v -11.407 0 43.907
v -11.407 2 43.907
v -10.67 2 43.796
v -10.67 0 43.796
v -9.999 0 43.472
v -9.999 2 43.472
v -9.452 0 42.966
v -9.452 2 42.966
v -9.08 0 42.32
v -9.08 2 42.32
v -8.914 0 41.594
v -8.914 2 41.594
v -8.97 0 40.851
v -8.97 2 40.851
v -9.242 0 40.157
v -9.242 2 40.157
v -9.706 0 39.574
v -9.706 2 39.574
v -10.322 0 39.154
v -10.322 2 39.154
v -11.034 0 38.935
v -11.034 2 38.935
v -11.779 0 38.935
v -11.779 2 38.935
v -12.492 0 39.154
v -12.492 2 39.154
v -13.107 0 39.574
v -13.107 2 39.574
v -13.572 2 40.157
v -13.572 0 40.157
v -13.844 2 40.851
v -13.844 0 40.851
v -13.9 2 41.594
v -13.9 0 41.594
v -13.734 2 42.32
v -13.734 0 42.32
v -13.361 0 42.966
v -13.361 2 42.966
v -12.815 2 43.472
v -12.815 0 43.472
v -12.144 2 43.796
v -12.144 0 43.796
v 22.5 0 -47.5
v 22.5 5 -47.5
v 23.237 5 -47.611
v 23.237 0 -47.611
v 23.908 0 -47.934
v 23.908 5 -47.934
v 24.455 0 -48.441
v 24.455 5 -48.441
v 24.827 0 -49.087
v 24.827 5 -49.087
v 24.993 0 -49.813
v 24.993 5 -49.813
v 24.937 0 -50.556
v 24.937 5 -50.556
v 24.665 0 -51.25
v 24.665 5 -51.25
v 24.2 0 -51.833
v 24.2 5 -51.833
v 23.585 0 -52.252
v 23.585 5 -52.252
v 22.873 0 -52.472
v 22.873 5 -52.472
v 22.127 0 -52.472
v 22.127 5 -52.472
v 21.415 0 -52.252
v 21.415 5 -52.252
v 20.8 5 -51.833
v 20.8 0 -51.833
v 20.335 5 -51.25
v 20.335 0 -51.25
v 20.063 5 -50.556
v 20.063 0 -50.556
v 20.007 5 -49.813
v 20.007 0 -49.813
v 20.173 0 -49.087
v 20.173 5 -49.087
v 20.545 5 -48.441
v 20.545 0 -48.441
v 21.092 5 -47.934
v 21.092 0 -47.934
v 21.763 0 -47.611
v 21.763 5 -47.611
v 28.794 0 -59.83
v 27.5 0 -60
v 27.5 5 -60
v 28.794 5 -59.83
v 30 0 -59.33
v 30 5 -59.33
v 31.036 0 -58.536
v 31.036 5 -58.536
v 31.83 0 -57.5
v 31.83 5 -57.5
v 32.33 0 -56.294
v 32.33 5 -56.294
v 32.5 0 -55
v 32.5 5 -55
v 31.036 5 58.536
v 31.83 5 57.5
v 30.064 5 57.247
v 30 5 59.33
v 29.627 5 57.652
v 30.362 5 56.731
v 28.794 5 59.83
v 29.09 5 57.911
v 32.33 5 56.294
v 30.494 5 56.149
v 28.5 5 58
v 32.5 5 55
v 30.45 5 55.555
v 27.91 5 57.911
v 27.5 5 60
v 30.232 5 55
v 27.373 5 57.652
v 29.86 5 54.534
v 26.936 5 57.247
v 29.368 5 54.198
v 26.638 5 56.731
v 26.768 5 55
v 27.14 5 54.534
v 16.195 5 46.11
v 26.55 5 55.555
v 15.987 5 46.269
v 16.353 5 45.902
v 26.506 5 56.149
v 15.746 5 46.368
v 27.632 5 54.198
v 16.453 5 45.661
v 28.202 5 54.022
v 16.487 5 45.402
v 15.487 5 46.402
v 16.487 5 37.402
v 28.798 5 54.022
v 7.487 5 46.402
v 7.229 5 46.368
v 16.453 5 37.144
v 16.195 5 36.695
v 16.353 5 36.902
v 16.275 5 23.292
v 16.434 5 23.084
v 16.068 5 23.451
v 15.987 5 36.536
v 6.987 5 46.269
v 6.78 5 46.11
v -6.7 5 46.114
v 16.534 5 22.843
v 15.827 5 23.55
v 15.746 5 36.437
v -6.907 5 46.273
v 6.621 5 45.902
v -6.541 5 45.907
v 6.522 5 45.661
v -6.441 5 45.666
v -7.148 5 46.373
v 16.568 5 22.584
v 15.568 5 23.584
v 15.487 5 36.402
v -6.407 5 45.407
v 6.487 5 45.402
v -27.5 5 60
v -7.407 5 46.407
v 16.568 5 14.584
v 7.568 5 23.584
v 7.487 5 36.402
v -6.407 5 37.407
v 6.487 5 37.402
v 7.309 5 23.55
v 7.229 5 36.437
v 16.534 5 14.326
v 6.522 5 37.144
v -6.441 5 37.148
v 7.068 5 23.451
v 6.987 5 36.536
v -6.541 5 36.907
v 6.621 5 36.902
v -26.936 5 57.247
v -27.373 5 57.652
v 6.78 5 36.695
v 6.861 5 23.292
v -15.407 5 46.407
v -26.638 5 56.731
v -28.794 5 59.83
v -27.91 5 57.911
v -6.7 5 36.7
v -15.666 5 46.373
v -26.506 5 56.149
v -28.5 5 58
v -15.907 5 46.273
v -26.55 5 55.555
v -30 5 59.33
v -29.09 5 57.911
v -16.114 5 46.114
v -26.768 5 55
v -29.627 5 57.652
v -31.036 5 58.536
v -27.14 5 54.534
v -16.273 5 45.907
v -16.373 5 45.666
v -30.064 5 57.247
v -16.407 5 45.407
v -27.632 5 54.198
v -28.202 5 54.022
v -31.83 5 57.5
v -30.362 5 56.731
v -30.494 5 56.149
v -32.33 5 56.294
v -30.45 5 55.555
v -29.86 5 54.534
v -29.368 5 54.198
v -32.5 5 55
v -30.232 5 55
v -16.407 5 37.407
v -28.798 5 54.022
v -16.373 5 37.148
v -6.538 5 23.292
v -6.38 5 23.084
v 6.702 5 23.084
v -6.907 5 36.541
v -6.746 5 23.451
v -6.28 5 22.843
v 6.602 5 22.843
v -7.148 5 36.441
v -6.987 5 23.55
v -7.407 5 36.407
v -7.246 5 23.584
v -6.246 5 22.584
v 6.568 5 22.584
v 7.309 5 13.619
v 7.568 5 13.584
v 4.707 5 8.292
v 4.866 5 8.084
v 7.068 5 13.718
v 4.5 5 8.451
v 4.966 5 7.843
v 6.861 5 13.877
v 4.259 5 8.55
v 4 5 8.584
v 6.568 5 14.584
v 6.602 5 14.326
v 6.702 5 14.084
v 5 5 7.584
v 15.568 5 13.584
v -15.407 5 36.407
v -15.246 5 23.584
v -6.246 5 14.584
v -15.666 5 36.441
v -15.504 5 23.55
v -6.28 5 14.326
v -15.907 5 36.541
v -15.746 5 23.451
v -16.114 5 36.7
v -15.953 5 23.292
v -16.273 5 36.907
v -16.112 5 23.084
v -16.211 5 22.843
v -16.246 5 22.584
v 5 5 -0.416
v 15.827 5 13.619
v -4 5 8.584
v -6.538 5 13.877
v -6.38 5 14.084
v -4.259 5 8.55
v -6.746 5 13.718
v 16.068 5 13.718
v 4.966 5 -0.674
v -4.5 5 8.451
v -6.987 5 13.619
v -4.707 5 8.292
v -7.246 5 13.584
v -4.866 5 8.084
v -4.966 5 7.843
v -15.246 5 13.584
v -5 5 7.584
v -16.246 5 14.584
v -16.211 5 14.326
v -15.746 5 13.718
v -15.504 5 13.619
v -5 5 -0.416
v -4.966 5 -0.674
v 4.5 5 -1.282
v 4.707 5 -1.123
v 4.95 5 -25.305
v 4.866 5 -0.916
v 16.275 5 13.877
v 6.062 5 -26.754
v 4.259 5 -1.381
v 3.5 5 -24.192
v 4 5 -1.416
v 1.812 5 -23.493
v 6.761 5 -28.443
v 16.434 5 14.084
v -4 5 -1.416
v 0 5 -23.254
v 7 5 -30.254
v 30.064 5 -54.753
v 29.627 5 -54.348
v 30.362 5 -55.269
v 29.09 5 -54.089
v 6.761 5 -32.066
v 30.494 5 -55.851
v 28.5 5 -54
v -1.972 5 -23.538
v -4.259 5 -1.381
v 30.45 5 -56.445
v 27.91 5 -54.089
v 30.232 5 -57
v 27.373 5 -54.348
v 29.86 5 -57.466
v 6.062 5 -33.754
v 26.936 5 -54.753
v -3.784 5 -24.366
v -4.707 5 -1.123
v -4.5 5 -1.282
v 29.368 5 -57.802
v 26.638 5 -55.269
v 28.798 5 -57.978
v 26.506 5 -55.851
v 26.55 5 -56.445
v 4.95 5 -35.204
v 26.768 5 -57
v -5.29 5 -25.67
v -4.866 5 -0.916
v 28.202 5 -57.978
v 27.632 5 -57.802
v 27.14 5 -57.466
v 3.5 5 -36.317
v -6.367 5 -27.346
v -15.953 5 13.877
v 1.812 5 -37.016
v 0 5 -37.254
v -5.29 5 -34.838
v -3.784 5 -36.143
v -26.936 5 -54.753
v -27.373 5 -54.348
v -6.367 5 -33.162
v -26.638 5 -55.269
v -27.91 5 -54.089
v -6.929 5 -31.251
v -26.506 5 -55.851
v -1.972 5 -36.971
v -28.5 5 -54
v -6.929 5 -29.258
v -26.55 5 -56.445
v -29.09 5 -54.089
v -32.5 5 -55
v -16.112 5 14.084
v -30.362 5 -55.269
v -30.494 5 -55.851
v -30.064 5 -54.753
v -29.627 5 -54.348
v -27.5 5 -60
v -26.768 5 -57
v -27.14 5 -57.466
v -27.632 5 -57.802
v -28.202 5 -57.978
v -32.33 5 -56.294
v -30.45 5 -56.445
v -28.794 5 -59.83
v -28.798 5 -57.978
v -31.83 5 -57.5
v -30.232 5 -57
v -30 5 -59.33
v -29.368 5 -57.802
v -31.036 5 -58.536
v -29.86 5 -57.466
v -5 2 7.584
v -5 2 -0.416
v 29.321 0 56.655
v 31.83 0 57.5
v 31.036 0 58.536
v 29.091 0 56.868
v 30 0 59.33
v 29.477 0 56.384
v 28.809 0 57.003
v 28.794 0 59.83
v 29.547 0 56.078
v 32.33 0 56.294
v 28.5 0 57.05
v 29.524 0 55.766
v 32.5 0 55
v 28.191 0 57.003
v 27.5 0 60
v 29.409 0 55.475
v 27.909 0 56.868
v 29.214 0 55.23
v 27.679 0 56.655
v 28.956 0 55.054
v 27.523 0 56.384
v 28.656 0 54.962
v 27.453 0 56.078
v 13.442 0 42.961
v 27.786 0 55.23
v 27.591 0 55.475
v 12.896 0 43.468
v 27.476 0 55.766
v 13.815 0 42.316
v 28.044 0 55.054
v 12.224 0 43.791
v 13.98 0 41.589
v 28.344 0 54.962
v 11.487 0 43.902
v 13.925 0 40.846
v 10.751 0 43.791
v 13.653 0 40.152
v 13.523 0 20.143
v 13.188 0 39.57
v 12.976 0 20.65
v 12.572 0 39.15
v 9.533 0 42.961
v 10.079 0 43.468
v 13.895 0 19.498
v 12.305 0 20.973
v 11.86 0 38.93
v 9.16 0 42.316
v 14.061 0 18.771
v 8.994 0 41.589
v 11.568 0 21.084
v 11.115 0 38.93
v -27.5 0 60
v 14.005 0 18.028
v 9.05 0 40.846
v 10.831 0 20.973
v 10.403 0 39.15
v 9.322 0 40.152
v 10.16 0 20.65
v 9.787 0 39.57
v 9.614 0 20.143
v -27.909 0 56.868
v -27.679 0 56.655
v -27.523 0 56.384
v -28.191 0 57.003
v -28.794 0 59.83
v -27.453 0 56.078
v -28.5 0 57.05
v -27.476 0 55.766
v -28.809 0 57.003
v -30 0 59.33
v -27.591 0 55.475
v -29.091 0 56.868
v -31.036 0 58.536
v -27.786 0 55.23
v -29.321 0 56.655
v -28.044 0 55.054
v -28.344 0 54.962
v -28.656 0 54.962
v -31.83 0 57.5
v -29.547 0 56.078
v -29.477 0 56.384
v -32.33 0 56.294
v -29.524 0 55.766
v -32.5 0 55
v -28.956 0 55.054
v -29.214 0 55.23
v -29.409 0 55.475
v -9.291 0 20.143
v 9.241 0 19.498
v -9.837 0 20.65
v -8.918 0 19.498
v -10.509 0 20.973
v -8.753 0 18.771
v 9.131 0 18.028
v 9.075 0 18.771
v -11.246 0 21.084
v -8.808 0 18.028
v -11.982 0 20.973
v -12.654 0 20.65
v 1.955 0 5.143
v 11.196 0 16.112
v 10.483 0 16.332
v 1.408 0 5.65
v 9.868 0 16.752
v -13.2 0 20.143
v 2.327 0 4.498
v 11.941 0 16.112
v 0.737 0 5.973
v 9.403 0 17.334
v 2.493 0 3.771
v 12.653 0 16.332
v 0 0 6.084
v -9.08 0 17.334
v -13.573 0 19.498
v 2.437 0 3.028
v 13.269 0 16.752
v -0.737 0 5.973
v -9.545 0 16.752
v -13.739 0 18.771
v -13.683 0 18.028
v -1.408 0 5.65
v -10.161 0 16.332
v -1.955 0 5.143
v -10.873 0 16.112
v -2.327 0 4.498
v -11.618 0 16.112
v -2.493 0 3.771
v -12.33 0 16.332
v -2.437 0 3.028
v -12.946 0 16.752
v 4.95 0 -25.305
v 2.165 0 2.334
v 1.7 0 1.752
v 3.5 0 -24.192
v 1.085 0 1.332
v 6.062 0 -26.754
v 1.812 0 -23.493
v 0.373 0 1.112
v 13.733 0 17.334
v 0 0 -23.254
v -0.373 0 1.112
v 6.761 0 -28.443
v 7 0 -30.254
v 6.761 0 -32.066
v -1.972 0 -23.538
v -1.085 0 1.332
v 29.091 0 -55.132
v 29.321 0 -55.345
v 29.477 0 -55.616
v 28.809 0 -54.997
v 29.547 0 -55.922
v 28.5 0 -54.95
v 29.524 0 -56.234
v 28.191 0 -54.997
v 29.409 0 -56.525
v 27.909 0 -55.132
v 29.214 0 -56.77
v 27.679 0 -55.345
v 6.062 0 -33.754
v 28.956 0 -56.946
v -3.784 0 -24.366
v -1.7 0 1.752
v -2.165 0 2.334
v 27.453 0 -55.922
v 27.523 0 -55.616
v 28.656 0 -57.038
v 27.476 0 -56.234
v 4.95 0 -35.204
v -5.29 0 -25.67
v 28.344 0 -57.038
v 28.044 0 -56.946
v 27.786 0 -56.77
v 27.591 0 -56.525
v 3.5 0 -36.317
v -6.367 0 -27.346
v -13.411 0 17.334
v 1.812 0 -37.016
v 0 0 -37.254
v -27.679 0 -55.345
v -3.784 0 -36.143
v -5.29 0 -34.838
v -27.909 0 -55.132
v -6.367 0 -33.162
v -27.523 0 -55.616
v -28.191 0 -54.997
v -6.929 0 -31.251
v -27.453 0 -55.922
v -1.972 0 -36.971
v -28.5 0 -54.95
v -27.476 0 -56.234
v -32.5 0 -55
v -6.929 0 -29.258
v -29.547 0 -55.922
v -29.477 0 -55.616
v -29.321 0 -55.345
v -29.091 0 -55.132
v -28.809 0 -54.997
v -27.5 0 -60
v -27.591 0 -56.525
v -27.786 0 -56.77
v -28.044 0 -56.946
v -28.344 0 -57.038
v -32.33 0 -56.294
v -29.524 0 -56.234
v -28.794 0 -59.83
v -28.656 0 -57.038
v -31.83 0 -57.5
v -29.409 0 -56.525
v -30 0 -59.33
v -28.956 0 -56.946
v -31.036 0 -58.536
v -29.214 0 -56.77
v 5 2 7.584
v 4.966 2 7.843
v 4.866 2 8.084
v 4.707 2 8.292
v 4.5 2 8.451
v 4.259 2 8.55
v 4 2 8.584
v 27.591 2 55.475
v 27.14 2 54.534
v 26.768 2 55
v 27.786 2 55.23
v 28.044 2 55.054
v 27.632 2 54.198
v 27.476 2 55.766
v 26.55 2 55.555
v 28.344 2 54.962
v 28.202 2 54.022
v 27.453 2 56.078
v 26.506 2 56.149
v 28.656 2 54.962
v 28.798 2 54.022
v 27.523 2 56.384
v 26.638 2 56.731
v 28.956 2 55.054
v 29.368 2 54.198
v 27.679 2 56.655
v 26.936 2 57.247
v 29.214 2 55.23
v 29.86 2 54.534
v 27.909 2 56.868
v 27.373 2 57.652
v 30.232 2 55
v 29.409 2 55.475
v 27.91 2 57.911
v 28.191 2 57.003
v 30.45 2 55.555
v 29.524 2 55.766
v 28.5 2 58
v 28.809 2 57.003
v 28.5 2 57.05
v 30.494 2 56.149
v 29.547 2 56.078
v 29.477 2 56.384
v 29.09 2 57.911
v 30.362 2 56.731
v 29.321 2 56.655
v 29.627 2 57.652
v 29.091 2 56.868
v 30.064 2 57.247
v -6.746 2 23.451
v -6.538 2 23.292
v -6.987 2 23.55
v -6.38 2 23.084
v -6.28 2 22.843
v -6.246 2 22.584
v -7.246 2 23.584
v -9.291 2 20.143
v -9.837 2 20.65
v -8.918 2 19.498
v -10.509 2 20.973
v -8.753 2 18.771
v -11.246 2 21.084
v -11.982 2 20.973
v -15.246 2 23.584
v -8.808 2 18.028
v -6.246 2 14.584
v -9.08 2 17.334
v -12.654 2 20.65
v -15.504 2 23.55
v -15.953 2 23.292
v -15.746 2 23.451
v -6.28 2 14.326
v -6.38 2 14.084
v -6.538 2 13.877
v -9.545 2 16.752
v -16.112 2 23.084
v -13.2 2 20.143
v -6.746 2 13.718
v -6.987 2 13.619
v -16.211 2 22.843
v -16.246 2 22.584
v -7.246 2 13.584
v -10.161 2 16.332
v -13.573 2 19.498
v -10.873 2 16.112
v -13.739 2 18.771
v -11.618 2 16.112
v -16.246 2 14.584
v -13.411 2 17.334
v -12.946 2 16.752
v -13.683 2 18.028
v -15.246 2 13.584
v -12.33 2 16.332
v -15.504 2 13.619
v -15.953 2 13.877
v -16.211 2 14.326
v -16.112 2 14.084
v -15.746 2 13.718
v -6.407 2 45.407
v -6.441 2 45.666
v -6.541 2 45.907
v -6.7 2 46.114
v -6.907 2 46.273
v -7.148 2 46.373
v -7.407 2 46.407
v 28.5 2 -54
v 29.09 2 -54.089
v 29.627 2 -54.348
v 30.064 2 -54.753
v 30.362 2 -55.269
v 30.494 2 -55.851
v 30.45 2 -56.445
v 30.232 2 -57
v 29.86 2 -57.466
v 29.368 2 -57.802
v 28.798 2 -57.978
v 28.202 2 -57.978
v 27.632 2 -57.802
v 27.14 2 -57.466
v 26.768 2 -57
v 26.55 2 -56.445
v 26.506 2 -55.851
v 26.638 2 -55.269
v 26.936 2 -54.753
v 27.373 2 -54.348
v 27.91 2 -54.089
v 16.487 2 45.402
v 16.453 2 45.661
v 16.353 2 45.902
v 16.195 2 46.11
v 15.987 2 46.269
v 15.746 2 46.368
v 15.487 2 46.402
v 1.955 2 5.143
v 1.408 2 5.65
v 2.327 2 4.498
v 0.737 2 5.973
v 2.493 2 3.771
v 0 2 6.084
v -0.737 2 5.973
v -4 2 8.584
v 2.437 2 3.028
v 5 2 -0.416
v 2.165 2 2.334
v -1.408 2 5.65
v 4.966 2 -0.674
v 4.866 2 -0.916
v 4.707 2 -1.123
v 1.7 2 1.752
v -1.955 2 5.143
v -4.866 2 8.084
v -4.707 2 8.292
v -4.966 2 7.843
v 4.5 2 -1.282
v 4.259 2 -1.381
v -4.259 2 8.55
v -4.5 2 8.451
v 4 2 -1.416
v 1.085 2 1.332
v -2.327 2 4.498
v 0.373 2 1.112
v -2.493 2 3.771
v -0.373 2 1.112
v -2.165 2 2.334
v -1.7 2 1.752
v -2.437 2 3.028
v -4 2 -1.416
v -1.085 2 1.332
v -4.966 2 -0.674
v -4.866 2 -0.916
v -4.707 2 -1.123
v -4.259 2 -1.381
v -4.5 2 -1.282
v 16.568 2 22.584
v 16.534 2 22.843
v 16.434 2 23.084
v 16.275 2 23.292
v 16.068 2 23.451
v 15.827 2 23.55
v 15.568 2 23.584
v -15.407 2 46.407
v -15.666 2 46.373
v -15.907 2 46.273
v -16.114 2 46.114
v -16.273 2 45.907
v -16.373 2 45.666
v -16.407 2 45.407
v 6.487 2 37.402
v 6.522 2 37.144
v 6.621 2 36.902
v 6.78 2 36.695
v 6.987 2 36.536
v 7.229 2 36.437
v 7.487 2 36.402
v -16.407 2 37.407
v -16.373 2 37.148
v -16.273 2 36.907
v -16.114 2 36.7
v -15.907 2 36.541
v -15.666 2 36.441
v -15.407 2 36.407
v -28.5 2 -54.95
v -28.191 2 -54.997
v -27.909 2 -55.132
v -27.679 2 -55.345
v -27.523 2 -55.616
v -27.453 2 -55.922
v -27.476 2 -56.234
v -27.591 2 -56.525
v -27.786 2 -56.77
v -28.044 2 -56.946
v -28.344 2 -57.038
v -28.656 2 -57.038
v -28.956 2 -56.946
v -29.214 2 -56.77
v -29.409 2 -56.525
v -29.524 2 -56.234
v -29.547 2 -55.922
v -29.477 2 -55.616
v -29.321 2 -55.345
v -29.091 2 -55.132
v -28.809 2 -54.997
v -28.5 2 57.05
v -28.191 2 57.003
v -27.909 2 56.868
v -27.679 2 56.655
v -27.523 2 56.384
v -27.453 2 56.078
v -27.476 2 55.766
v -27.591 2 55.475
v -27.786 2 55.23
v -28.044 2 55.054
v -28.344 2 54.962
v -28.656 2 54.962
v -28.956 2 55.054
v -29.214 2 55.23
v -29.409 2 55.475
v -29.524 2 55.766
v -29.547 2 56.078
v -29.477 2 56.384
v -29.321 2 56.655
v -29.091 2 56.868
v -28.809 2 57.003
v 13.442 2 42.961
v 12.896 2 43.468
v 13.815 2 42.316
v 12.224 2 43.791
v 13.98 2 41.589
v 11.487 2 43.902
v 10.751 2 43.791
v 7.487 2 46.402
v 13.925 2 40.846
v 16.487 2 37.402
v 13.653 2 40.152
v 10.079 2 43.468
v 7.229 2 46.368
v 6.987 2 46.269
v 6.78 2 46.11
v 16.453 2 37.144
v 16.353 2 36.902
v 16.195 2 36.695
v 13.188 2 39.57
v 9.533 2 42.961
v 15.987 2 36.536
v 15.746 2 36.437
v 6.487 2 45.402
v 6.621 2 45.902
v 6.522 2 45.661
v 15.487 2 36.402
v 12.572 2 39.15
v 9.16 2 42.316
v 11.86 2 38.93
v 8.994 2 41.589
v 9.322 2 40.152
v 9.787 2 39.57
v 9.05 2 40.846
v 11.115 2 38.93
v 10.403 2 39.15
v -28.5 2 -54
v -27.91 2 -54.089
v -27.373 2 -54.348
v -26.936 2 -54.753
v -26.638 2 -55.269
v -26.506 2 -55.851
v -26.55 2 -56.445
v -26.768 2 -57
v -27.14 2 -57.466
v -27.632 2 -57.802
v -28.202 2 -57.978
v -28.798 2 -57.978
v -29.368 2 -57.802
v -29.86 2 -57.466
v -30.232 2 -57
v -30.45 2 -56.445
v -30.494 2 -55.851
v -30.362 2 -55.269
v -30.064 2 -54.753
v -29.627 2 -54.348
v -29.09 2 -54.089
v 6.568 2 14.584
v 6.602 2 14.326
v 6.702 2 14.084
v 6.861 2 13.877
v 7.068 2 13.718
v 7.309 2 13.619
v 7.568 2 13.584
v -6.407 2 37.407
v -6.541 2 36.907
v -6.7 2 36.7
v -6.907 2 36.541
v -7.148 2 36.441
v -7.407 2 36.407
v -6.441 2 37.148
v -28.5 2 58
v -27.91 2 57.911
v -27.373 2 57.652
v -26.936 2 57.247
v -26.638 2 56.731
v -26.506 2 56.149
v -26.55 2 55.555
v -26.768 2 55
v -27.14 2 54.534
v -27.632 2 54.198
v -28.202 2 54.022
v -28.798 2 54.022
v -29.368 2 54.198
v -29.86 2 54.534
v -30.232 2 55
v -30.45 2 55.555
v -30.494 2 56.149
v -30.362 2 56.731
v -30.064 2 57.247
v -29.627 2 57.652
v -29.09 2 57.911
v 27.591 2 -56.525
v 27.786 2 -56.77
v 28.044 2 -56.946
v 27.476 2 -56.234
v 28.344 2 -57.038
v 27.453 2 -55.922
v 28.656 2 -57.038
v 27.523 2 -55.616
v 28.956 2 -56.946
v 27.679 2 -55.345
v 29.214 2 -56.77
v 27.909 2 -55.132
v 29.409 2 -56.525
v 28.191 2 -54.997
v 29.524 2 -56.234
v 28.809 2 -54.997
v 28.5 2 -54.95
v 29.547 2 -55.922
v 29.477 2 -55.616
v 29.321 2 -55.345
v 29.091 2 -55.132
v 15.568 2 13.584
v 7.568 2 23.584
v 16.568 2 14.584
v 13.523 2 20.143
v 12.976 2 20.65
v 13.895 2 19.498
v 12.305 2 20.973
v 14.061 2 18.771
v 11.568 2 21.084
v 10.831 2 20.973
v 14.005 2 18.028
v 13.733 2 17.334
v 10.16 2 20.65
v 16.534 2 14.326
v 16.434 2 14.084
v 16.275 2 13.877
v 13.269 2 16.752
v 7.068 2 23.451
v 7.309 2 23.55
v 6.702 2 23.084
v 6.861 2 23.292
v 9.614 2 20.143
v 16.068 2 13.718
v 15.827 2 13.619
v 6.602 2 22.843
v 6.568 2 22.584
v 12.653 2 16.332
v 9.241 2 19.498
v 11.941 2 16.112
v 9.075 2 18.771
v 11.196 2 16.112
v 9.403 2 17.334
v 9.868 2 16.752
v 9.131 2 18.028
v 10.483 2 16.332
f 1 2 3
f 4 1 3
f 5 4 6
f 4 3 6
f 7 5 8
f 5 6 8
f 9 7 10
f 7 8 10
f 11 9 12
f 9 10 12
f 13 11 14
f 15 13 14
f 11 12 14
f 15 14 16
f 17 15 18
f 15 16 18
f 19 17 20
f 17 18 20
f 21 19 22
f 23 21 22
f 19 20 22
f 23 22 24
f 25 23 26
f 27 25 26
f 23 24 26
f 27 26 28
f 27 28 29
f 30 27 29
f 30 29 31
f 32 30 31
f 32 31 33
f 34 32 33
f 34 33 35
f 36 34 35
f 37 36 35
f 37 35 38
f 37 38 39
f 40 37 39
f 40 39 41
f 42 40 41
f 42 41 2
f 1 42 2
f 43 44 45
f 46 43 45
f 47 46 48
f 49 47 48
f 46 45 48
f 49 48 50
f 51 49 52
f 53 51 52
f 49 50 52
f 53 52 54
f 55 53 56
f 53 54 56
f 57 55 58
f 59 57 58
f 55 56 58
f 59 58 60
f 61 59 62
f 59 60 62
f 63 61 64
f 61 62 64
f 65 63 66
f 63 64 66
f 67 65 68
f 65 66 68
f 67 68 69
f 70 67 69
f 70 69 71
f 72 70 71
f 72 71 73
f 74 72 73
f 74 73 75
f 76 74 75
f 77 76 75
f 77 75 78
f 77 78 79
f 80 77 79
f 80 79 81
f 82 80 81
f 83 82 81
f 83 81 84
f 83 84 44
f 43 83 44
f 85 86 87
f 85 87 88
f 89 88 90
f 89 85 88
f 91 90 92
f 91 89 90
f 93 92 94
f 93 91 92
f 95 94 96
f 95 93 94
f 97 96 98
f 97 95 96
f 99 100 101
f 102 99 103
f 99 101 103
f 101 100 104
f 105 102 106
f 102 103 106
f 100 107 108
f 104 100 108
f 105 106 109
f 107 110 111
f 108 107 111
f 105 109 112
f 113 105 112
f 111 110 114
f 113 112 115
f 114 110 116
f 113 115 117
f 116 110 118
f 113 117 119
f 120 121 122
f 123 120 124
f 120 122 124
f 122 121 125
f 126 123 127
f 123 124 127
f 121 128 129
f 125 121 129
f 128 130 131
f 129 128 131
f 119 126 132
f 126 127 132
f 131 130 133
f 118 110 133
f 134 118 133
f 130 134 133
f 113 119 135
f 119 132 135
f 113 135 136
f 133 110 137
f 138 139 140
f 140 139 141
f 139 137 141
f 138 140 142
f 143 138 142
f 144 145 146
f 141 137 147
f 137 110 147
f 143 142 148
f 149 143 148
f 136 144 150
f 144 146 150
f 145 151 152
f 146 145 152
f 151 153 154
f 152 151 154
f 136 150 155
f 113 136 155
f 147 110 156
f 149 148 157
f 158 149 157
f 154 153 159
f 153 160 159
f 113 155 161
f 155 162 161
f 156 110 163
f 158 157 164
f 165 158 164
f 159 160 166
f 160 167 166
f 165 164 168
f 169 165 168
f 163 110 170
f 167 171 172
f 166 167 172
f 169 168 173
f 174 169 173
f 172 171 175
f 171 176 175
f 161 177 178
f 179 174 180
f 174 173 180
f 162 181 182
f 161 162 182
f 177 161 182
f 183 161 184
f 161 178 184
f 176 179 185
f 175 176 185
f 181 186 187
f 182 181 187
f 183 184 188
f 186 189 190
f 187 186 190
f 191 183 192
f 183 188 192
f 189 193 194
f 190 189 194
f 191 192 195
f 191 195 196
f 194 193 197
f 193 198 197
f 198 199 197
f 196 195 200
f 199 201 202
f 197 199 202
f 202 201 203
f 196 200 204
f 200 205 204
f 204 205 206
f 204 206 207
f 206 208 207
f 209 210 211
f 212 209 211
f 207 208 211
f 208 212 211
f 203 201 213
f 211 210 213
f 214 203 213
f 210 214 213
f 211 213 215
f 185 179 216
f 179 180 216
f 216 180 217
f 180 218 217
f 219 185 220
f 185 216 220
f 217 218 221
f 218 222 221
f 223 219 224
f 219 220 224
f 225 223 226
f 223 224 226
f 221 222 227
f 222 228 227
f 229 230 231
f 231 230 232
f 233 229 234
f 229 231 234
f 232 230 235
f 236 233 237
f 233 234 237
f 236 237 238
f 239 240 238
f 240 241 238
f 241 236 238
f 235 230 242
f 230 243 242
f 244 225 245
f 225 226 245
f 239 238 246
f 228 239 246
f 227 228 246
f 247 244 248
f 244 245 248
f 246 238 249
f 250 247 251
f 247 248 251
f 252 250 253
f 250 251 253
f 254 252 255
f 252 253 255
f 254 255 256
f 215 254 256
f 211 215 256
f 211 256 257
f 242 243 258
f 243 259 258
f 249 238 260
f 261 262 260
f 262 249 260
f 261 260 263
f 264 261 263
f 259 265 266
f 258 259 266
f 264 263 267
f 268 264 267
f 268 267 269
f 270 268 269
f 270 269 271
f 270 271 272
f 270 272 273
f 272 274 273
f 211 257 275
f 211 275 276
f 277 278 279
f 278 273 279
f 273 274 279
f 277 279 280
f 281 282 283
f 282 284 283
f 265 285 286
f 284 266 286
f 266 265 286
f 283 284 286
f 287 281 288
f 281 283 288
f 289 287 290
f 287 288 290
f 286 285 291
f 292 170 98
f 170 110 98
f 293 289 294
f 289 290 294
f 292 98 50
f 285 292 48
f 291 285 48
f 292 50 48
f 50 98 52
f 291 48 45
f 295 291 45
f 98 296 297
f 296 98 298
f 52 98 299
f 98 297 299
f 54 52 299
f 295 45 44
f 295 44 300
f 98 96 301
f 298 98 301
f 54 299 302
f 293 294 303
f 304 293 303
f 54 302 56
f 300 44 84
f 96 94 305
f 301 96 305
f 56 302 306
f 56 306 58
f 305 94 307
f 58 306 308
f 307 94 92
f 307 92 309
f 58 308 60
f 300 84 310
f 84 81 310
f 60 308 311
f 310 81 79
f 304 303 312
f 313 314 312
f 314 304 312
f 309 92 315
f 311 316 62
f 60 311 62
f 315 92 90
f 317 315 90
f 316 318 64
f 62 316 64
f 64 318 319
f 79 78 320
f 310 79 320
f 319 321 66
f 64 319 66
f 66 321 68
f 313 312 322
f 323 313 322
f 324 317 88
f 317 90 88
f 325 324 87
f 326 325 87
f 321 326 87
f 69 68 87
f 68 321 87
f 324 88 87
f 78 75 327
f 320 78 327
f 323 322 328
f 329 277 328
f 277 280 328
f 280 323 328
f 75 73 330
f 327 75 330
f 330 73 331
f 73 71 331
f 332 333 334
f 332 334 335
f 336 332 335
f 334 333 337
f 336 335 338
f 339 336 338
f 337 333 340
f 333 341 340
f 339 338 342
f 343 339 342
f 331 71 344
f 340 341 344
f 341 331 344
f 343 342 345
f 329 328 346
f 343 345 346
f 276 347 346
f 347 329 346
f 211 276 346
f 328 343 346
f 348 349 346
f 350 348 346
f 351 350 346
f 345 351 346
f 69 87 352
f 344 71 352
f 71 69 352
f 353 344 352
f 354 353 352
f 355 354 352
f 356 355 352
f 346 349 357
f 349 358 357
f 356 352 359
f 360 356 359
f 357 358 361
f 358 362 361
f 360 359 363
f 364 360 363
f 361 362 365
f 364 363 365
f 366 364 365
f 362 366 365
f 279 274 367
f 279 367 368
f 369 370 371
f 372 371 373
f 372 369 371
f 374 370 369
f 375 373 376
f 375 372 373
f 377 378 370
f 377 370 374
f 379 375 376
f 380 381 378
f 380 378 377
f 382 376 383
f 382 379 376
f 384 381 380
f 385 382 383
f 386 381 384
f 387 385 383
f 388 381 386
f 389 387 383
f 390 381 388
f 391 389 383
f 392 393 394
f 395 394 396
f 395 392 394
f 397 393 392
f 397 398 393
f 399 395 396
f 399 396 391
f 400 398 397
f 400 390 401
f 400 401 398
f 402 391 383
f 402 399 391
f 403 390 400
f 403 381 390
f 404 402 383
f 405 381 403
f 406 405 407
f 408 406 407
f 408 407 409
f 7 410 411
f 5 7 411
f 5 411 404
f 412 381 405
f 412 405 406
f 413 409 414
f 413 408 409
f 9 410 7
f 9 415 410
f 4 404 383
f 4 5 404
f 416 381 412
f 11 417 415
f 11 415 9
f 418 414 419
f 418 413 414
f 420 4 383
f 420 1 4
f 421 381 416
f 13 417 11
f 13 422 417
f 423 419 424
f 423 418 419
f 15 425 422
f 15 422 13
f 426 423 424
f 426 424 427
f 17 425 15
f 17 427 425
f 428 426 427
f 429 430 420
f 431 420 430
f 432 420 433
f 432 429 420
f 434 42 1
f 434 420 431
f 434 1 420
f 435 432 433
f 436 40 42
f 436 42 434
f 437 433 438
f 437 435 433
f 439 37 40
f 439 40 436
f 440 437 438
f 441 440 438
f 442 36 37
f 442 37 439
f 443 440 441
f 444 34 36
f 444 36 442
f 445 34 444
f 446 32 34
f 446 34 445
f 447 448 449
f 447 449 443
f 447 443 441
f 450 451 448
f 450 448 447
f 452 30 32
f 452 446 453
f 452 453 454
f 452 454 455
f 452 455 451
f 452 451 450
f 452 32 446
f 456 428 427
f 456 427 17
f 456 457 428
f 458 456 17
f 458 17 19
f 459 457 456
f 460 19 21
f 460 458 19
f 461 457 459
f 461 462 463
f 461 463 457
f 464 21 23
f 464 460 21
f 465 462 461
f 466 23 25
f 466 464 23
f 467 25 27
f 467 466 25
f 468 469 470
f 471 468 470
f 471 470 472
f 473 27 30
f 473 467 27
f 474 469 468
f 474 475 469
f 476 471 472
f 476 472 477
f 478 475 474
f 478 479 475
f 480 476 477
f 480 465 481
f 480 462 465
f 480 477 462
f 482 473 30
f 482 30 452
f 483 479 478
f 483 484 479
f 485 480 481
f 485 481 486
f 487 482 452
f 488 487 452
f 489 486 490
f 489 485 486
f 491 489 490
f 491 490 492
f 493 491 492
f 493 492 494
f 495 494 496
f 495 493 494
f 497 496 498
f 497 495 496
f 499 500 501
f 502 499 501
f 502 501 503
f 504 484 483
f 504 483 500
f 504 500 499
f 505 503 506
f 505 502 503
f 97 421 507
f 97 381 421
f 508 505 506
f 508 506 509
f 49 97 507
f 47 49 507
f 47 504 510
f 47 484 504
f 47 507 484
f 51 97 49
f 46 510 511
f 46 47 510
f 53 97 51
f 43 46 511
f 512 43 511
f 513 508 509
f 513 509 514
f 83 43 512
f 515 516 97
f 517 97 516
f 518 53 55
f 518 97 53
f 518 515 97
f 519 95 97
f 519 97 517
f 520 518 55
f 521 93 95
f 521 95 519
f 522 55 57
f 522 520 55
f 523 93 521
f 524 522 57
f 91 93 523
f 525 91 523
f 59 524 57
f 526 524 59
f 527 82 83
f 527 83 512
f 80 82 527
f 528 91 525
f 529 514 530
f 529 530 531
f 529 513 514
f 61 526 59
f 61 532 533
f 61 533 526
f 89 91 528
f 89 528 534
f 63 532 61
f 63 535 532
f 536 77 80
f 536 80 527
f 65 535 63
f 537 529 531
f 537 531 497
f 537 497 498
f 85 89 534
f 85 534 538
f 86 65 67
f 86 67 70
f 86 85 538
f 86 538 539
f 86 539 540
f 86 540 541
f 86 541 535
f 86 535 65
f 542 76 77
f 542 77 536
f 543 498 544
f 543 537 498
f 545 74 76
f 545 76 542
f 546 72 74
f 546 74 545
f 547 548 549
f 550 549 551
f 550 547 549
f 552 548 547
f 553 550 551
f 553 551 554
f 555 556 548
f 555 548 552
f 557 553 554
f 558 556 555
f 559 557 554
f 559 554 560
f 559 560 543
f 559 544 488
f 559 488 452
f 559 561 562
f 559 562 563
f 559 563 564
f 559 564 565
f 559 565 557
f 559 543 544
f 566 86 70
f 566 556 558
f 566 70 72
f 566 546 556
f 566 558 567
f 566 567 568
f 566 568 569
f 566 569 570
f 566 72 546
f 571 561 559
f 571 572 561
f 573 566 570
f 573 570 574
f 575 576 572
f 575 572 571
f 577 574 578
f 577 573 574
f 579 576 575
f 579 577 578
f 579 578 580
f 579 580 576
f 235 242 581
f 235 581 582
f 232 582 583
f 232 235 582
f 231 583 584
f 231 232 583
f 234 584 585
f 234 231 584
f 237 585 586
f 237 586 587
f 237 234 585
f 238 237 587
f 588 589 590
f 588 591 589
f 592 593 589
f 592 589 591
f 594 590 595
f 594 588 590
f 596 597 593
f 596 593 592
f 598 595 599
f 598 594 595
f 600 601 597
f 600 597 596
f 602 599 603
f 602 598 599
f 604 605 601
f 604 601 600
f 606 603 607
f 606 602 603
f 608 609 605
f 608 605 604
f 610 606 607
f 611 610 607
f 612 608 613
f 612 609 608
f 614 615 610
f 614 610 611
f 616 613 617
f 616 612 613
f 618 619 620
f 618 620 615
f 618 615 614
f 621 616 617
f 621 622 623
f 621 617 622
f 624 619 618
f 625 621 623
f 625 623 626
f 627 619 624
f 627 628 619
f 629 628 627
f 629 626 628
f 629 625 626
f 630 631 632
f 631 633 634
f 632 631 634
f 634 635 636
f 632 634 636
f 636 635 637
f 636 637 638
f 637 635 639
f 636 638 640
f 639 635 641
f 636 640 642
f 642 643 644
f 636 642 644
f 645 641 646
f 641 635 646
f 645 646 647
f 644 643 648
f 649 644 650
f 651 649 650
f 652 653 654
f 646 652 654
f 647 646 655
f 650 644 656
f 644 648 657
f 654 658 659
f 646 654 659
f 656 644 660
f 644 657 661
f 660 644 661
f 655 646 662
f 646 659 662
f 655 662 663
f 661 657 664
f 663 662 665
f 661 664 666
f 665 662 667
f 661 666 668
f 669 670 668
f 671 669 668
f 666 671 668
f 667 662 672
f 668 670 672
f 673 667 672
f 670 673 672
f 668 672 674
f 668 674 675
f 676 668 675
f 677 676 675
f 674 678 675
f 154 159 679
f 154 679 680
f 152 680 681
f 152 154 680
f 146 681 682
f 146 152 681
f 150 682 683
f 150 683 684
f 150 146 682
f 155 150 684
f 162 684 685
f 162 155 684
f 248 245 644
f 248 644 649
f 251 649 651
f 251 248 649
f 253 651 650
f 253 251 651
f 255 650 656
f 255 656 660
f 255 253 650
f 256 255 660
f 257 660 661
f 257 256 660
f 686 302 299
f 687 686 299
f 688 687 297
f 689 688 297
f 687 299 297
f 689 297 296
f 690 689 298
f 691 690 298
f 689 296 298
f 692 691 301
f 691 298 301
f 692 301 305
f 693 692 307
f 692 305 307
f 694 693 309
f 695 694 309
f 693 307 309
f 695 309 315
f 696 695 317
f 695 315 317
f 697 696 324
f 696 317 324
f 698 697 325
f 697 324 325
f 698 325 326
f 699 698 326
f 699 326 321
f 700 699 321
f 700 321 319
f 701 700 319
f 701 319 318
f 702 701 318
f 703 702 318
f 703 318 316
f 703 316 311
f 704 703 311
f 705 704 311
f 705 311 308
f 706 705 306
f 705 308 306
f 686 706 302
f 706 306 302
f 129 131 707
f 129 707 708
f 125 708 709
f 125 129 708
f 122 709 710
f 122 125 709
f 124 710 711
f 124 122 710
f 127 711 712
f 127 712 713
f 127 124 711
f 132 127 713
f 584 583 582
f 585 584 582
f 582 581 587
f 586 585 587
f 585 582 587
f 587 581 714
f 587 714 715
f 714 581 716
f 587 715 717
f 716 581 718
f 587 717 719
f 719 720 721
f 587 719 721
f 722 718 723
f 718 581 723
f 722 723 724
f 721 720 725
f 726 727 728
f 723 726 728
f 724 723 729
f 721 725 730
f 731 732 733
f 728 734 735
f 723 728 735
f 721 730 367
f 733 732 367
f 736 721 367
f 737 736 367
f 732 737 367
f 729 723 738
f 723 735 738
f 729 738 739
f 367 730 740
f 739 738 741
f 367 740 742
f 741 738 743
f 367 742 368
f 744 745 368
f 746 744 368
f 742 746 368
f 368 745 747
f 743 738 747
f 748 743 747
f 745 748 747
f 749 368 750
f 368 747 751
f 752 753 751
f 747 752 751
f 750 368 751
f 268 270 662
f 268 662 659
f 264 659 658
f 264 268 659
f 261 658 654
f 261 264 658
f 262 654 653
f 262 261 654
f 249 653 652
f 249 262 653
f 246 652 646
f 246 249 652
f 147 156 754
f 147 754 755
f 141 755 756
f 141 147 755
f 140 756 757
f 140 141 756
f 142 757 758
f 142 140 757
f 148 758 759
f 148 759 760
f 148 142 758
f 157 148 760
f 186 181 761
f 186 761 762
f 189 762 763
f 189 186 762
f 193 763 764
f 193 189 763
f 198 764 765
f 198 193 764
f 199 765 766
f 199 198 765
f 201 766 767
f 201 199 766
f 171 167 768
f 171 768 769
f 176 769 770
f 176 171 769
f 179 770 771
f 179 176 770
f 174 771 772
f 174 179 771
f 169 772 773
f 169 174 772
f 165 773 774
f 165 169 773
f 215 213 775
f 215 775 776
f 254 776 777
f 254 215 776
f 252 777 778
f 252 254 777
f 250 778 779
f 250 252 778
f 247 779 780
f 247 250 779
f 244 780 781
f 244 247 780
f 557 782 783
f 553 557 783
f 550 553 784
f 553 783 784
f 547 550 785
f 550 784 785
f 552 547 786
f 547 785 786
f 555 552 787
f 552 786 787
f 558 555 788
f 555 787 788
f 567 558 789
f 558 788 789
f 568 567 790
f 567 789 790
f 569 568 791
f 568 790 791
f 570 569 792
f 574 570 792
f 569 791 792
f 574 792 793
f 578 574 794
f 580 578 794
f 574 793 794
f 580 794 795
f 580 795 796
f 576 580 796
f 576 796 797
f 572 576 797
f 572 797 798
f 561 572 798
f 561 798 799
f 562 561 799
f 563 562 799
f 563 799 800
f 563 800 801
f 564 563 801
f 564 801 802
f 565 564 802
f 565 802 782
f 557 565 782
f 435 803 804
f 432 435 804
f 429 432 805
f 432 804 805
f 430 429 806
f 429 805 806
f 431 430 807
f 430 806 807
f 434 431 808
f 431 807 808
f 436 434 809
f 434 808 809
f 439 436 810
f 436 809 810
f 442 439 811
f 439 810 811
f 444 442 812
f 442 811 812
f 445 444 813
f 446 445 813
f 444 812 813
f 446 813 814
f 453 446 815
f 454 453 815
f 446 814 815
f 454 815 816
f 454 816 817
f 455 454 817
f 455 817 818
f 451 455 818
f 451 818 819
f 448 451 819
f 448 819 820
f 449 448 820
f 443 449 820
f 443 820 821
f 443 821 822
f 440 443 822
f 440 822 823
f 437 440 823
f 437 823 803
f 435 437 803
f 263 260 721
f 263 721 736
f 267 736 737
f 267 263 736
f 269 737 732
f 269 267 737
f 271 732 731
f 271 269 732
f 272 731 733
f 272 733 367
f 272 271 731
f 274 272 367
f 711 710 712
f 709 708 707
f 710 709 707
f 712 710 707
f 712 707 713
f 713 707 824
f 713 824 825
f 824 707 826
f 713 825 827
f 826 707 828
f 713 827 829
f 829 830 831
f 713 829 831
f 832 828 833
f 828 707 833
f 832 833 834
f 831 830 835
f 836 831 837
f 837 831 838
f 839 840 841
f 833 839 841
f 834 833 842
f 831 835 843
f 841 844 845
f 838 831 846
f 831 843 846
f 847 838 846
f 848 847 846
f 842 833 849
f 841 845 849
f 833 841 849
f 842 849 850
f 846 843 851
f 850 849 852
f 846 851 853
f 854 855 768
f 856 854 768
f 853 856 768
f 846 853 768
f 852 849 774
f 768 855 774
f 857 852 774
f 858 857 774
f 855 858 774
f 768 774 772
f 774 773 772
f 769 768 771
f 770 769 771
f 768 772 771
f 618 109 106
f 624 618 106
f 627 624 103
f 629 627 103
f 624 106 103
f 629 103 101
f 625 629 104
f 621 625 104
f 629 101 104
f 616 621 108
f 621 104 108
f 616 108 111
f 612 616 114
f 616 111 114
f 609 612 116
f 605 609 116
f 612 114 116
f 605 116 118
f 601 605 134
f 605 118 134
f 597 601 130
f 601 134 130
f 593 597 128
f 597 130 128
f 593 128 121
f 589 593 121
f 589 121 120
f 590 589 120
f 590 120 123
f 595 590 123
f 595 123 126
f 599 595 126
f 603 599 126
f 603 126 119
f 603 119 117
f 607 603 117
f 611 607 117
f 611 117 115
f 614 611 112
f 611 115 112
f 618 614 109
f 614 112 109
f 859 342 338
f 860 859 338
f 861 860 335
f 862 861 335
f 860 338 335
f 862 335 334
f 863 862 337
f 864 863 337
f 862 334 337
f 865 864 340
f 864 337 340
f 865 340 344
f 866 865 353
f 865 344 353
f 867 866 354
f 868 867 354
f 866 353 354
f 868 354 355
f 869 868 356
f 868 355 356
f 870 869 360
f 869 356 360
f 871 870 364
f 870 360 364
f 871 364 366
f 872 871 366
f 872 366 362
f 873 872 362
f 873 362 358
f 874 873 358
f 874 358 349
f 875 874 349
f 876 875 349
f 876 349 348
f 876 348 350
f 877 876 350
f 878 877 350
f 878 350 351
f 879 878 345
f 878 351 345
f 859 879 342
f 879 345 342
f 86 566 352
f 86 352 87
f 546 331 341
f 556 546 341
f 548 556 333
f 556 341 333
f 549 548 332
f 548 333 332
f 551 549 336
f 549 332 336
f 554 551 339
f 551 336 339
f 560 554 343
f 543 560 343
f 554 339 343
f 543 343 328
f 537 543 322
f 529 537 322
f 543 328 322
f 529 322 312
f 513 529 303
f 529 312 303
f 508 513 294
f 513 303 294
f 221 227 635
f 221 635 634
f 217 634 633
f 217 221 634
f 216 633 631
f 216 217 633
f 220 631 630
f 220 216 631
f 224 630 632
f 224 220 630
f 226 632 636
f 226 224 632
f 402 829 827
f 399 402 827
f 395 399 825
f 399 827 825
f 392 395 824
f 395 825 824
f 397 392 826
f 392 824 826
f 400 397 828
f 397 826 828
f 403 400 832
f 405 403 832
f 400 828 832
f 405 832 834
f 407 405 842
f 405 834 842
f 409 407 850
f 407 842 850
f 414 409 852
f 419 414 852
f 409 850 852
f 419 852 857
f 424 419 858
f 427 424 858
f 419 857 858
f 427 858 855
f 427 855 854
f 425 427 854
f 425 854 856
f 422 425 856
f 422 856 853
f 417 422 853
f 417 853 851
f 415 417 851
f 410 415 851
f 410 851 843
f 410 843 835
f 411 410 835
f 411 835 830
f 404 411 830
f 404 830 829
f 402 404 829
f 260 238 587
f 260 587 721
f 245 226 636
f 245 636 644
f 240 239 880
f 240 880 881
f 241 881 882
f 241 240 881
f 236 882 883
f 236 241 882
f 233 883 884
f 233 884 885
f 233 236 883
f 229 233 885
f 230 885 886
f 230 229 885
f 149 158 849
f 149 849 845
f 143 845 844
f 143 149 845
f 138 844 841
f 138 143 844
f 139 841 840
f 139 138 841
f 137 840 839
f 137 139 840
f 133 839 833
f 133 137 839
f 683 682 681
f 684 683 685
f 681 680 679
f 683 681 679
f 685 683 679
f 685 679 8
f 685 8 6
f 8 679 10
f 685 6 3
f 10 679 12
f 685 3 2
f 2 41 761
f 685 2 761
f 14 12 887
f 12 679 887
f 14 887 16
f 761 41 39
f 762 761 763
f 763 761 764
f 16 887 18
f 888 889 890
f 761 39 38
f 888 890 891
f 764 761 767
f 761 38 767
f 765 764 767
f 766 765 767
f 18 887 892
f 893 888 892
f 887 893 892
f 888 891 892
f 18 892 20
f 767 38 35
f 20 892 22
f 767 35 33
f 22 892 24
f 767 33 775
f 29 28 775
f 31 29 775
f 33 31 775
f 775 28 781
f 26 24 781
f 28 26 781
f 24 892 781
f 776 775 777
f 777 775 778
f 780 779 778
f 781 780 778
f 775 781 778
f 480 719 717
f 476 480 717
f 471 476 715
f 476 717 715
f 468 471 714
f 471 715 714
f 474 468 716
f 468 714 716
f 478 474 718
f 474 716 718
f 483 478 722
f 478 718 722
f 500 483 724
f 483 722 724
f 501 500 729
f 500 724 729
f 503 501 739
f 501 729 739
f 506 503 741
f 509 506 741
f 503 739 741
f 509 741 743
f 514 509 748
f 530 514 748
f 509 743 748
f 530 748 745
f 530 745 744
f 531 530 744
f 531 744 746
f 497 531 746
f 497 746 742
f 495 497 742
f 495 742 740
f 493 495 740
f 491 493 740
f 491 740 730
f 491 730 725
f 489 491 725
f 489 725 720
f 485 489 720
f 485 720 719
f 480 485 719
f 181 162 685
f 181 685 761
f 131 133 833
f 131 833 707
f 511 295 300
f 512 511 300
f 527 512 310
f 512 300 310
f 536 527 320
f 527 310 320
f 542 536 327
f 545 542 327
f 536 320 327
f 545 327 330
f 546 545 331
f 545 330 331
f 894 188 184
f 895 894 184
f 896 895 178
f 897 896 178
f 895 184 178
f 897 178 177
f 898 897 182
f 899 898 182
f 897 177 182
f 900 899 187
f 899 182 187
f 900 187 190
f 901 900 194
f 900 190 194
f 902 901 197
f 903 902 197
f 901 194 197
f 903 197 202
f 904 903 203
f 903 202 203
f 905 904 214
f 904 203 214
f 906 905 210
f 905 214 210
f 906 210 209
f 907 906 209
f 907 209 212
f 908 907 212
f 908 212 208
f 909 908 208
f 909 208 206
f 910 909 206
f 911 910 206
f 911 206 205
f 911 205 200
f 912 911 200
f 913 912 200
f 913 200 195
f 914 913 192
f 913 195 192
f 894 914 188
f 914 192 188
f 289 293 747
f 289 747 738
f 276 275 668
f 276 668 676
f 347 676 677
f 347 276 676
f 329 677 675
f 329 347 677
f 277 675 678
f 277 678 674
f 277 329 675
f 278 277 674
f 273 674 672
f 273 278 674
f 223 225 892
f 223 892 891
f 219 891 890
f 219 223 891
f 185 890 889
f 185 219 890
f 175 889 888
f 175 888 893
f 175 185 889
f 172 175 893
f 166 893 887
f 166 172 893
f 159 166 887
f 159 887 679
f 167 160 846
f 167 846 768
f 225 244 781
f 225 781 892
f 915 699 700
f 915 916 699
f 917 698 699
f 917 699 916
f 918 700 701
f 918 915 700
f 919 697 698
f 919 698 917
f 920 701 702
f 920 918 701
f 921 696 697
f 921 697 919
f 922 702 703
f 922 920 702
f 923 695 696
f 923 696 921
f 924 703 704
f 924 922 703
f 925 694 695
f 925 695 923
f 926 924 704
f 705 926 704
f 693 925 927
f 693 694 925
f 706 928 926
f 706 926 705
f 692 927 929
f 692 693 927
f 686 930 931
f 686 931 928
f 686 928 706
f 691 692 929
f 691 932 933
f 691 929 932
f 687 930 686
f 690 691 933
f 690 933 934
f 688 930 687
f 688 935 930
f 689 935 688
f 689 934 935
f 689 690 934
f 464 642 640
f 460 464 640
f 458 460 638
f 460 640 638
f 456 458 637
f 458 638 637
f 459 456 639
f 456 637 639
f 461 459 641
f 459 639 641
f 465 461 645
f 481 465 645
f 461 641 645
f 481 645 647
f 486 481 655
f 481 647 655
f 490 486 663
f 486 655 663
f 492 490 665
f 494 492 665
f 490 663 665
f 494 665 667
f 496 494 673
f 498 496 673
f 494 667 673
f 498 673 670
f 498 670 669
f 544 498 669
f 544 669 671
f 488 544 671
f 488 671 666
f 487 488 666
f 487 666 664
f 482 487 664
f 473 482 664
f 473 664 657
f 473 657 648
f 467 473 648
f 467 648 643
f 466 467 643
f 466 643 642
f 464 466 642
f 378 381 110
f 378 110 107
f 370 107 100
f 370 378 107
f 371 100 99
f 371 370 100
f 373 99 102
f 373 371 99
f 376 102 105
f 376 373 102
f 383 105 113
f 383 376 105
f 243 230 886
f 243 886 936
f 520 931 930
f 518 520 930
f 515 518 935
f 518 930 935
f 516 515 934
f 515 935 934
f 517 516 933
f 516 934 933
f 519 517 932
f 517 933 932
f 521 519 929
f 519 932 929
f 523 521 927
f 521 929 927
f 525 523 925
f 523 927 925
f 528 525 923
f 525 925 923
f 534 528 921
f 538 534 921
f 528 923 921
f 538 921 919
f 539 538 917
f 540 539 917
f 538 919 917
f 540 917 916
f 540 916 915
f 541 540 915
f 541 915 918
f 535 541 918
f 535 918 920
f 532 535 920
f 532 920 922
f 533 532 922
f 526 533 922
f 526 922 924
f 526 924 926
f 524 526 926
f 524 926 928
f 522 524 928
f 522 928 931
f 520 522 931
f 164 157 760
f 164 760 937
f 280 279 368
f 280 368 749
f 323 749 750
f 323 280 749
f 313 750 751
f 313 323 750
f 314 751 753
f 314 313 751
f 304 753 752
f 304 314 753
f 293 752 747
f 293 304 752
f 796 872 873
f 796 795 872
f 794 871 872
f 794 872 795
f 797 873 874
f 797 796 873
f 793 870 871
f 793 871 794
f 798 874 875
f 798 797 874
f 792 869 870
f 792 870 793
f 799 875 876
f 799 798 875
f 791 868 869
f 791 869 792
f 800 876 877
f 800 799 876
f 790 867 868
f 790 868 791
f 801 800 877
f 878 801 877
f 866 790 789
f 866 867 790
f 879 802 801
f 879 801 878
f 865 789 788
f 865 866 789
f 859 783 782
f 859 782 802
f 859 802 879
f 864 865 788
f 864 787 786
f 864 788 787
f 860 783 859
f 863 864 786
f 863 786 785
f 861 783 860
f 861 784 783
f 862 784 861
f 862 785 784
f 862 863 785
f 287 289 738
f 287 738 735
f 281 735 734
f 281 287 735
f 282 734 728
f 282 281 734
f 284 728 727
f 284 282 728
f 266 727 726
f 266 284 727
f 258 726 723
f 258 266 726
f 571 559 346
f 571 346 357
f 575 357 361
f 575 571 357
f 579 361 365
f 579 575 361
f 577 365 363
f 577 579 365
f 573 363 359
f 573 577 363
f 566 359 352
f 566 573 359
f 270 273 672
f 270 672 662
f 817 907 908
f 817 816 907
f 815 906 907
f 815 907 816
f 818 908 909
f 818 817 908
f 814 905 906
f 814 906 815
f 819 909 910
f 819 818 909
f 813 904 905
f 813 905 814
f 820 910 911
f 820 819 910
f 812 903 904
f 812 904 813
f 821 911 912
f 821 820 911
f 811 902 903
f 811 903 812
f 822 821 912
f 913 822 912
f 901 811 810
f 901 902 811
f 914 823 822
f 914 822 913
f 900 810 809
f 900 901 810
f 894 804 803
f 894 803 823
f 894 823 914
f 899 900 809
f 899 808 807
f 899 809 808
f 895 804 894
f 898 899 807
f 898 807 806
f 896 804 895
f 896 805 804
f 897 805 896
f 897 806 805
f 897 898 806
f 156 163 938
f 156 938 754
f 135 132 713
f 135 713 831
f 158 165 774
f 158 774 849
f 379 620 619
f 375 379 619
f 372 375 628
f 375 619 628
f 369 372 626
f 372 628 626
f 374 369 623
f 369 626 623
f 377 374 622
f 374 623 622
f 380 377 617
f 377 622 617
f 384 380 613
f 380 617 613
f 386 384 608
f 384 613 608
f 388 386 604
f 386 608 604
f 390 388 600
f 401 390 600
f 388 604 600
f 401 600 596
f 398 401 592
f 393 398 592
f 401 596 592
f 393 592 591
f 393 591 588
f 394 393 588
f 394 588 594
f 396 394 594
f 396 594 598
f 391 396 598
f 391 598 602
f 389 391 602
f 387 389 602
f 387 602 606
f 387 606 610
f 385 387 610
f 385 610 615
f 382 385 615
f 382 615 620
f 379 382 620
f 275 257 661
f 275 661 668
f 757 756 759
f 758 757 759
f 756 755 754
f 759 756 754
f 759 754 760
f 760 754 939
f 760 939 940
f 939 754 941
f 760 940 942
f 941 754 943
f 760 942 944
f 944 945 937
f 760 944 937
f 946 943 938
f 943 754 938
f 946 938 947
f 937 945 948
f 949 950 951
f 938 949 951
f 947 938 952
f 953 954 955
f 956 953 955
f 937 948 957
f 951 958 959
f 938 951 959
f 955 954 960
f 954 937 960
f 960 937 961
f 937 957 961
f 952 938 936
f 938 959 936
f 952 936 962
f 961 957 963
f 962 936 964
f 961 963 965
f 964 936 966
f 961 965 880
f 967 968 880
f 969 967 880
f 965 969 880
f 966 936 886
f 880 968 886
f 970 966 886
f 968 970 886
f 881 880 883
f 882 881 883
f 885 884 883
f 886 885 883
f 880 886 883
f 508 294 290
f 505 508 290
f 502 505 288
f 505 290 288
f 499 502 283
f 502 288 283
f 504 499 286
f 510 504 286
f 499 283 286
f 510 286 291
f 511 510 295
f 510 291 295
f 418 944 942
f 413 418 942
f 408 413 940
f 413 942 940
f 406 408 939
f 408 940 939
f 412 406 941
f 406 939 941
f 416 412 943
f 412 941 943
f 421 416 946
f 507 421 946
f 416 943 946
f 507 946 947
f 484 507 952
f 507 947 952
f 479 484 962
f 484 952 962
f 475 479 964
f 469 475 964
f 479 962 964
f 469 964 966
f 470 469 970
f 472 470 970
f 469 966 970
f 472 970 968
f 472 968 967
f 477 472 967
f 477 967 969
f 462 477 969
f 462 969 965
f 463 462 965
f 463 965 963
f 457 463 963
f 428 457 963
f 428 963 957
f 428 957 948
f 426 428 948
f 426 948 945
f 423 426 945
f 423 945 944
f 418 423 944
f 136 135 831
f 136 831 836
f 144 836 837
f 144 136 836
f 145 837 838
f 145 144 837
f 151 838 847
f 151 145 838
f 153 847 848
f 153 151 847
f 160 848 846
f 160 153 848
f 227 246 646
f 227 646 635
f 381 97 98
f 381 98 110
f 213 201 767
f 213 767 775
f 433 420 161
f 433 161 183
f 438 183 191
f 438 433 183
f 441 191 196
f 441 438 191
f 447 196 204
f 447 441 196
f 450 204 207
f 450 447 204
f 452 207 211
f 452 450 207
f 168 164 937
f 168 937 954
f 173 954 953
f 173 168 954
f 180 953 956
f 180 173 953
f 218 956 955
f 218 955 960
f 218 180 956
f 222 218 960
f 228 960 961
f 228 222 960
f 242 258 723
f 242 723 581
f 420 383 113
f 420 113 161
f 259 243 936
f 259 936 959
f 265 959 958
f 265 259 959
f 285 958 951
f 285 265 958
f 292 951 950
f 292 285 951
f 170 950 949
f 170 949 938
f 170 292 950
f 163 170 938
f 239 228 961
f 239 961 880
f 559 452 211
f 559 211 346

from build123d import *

# Parameters (mm, degrees)
BOSS_EXTRUDE1_DEPTH = 5
SKETCH2_R           = 1.05
CUT_EXTRUDE1_DEPTH  = 5
SKETCH3_R           = 2
CUT_EXTRUDE2_DEPTH  = 3
CUT_EXTRUDE3_DEPTH  = 69.419660917
SKETCH5_R           = 2.5
CUT_EXTRUDE5_DEPTH  = 69.419660917
CUT_EXTRUDE7_DEPTH  = 3


with BuildPart() as part:
    # Sketch1 → Boss-Extrude1 (new body)
    with BuildSketch(Plane(origin=(0, 0, 0), x_dir=(1, 0, 0), z_dir=(0, 1, 0))):
        with BuildLine():
            Line((-27.5, 60), (27.5, 60))
            ThreePointArc((27.5, 60), (31.035533906, 58.535533906), (32.5, 55))
            Line((32.5, 55), (32.5, -55))
            ThreePointArc((32.5, -55), (31.035533906, -58.535533906), (27.5, -60))
            Line((27.5, -60), (-27.5, -60))
            ThreePointArc((-27.5, -60), (-31.035533906, -58.535533906), (-32.5, -55))
            Line((-32.5, -55), (-32.5, 55))
            ThreePointArc((-32.5, 55), (-31.035533906, 58.535533906), (-27.5, 60))
        make_face()
    extrude(amount=BOSS_EXTRUDE1_DEPTH)

    # Sketch2 → Cut-Extrude1 (cut)
    with BuildSketch(Plane(origin=(0, 5, 0), x_dir=(1, 0, 0), z_dir=(0, 1, 0))):
        with Locations(Location((-28.5, 56, 0), (0, 0, 270))):
            Circle(SKETCH2_R)
        with Locations(Location((28.5, 56, 0), (0, 0, 270))):
            Circle(SKETCH2_R)
        with Locations(Location((28.5, -56, 0), (0, 0, 270))):
            Circle(SKETCH2_R)
        with Locations(Location((-28.5, -56, 0), (0, 0, 270))):
            Circle(SKETCH2_R)
    extrude(amount=-CUT_EXTRUDE1_DEPTH, mode=Mode.SUBTRACT)

    # Sketch3 → Cut-Extrude2 (cut)
    with BuildSketch(Plane(origin=(0, 5, 0), x_dir=(1, 0, 0), z_dir=(0, 1, 0))):
        with Locations(Location((-28.5, 56, 0), (0, 0, 270))):
            Circle(SKETCH3_R)
        with Locations(Location((28.5, 56, 0), (0, 0, 270))):
            Circle(SKETCH3_R)
        with Locations(Location((28.5, -56, 0), (0, 0, 270))):
            Circle(SKETCH3_R)
        with Locations(Location((-28.5, -56, 0), (0, 0, 270))):
            Circle(SKETCH3_R)
    extrude(amount=-CUT_EXTRUDE2_DEPTH, mode=Mode.SUBTRACT)

    # Sketch4 → Cut-Extrude3 (cut, through all)
    with BuildSketch(Plane(origin=(0, 5, 0), x_dir=(1, 0, 0), z_dir=(0, 1, 0))):
        with BuildLine():
            ThreePointArc((7, 30.254330519), (4.949747468, 35.204077987), (0, 37.254330519))
            Line((0, 37.254330519), (0, 23.254330519))
            ThreePointArc((0, 23.254330519), (4.949747468, 25.304583051), (7, 30.254330519))
        make_face()
        with BuildLine():
            Line((0, 23.254330519), (0, 37.254330519))
            ThreePointArc((0, 37.254330519), (-7, 30.254330519), (0, 23.254330519))
        make_face()
    extrude(amount=-CUT_EXTRUDE3_DEPTH, mode=Mode.SUBTRACT)

    # Sketch5 → Cut-Extrude5 (cut, through all)
    with BuildSketch(Plane(origin=(0, 5, 0), x_dir=(1, 0, 0), z_dir=(0, 1, 0))):
        with Locations(Location((22.5, 50, 0), (0, 0, 270))):
            Circle(SKETCH5_R)
        with Locations(Location((0, -3.584481164, 0), (0, 0, 270))):
            Circle(SKETCH5_R)
        with Locations(Location((11.568109832, -18.584481164, 0), (0, 0, 270))):
            Circle(SKETCH5_R)
        with Locations(Location((11.487471201, -41.402489438, 0), (0, 0, 270))):
            Circle(SKETCH5_R)
        with Locations(Location((-11.406832571, -41.406832571, 0), (0, 0, 270))):
            Circle(SKETCH5_R)
        with Locations(Location((-11.24555531, -18.584481164, 0), (0, 0, 270))):
            Circle(SKETCH5_R)
    extrude(amount=-CUT_EXTRUDE5_DEPTH, mode=Mode.SUBTRACT)

    # Sketch6 → Cut-Extrude7 (cut)
    with BuildSketch(Plane(origin=(0, 5, 0), x_dir=(1, 0, 0), z_dir=(0, 1, 0))):
        with BuildLine():
            Line((7.568109832, -13.584481164), (15.568109832, -13.584481164))
            ThreePointArc((15.568109832, -13.584481164), (16.275216613, -13.877374383), (16.568109832, -14.584481164))
            Line((16.568109832, -14.584481164), (16.568109832, -22.584481164))
            ThreePointArc((16.568109832, -22.584481164), (16.275216613, -23.291587945), (15.568109832, -23.584481164))
            Line((15.568109832, -23.584481164), (7.568109832, -23.584481164))
            ThreePointArc((7.568109832, -23.584481164), (6.86100305, -23.291587945), (6.568109832, -22.584481164))
            Line((6.568109832, -22.584481164), (6.568109832, -14.584481164))
            ThreePointArc((6.568109832, -14.584481164), (6.86100305, -13.877374383), (7.568109832, -13.584481164))
        make_face()
        with BuildLine():
            Line((-15.24555531, -13.584481164), (-7.24555531, -13.584481164))
            ThreePointArc((-7.24555531, -13.584481164), (-6.538448529, -13.877374383), (-6.24555531, -14.584481164))
            Line((-6.24555531, -14.584481164), (-6.24555531, -22.584481164))
            ThreePointArc((-6.24555531, -22.584481164), (-6.538448529, -23.291587945), (-7.24555531, -23.584481164))
            Line((-7.24555531, -23.584481164), (-15.24555531, -23.584481164))
            ThreePointArc((-15.24555531, -23.584481164), (-15.952662092, -23.291587945), (-16.24555531, -22.584481164))
            Line((-16.24555531, -22.584481164), (-16.24555531, -14.584481164))
            ThreePointArc((-16.24555531, -14.584481164), (-15.952662092, -13.877374383), (-15.24555531, -13.584481164))
        make_face()
        with BuildLine():
            Line((-15.406832571, -36.406832571), (-7.406832571, -36.406832571))
            ThreePointArc((-7.406832571, -36.406832571), (-6.69972579, -36.69972579), (-6.406832571, -37.406832571))
            Line((-6.406832571, -37.406832571), (-6.406832571, -45.406832571))
            ThreePointArc((-6.406832571, -45.406832571), (-6.69972579, -46.113939352), (-7.406832571, -46.406832571))
            Line((-7.406832571, -46.406832571), (-15.406832571, -46.406832571))
            ThreePointArc((-15.406832571, -46.406832571), (-16.113939352, -46.113939352), (-16.406832571, -45.406832571))
            Line((-16.406832571, -45.406832571), (-16.406832571, -37.406832571))
            ThreePointArc((-16.406832571, -37.406832571), (-16.113939352, -36.69972579), (-15.406832571, -36.406832571))
        make_face()
        with BuildLine():
            Line((7.487471201, -36.402489438), (15.487471201, -36.402489438))
            ThreePointArc((15.487471201, -36.402489438), (16.194577983, -36.695382657), (16.487471201, -37.402489438))
            Line((16.487471201, -37.402489438), (16.487471201, -45.402489438))
            ThreePointArc((16.487471201, -45.402489438), (16.194577983, -46.10959622), (15.487471201, -46.402489438))
            Line((15.487471201, -46.402489438), (7.487471201, -46.402489438))
            ThreePointArc((7.487471201, -46.402489438), (6.78036442, -46.10959622), (6.487471201, -45.402489438))
            Line((6.487471201, -45.402489438), (6.487471201, -37.402489438))
            ThreePointArc((6.487471201, -37.402489438), (6.78036442, -36.695382657), (7.487471201, -36.402489438))
        make_face()
        with BuildLine():
            Line((-4, 1.415518836), (4, 1.415518836))
            ThreePointArc((4, 1.415518836), (4.707106781, 1.122625617), (5, 0.415518836))
            Line((5, 0.415518836), (5, -7.584481164))
            ThreePointArc((5, -7.584481164), (4.707106781, -8.291587945), (4, -8.584481164))
            Line((4, -8.584481164), (-4, -8.584481164))
            ThreePointArc((-4, -8.584481164), (-4.707106781, -8.291587945), (-5, -7.584481164))
            Line((-5, -7.584481164), (-5, 0.415518836))
            ThreePointArc((-5, 0.415518836), (-4.707106781, 1.122625617), (-4, 1.415518836))
        make_face()
    extrude(amount=-CUT_EXTRUDE7_DEPTH, mode=Mode.SUBTRACT)


solid = part.part
